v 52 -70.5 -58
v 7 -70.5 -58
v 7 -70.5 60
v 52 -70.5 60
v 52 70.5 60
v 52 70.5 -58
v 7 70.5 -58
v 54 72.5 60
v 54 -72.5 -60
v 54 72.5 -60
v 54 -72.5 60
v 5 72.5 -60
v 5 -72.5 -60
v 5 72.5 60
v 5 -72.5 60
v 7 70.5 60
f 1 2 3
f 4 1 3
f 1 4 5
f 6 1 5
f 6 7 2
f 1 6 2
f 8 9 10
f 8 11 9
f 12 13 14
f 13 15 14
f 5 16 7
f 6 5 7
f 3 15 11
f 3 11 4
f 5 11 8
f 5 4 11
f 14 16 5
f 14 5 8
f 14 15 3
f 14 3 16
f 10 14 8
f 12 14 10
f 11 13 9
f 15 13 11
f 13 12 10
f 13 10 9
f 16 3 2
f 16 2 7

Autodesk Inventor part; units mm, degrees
ref_plane "YZ Plane" through (0, 0, 0) normal (1, 0, 0) x (0, 1, 0)
ref_plane "XZ Plane" through (0, 0, 0) normal (0, 1, 0) x (-1, 0, 0)
ref_plane "Work Plane1" through (5, 0, 0) normal (1, 0, 0) x (0, 1, 0)
sketch "Sketch1" plane through (5, 0, 0) normal (1, 0, 0) x (0, 1, 0)
  line L0 (-72.5, 60) -> (72.5, 60)
  line L1 (72.5, 60) -> (72.5, -60)
  line L2 (72.5, -60) -> (-72.5, -60)
  line L3 (-72.5, -60) -> (-72.5, 60)
  line L4 (-72.5, 60) -> (72.5, -60) construction
  line L5 (72.5, 60) -> (-72.5, -60) construction
  point P0 (0, 0)
  dimension "d0" = 145
  dimension "d1" = 120
extrude "Extrusion1" add sketch "Sketch1" along normal blind 49
shell "Shell2" thickness 2 removed faces 1 at (21.3333, -24.1667, 60)
properties part number "Case"
